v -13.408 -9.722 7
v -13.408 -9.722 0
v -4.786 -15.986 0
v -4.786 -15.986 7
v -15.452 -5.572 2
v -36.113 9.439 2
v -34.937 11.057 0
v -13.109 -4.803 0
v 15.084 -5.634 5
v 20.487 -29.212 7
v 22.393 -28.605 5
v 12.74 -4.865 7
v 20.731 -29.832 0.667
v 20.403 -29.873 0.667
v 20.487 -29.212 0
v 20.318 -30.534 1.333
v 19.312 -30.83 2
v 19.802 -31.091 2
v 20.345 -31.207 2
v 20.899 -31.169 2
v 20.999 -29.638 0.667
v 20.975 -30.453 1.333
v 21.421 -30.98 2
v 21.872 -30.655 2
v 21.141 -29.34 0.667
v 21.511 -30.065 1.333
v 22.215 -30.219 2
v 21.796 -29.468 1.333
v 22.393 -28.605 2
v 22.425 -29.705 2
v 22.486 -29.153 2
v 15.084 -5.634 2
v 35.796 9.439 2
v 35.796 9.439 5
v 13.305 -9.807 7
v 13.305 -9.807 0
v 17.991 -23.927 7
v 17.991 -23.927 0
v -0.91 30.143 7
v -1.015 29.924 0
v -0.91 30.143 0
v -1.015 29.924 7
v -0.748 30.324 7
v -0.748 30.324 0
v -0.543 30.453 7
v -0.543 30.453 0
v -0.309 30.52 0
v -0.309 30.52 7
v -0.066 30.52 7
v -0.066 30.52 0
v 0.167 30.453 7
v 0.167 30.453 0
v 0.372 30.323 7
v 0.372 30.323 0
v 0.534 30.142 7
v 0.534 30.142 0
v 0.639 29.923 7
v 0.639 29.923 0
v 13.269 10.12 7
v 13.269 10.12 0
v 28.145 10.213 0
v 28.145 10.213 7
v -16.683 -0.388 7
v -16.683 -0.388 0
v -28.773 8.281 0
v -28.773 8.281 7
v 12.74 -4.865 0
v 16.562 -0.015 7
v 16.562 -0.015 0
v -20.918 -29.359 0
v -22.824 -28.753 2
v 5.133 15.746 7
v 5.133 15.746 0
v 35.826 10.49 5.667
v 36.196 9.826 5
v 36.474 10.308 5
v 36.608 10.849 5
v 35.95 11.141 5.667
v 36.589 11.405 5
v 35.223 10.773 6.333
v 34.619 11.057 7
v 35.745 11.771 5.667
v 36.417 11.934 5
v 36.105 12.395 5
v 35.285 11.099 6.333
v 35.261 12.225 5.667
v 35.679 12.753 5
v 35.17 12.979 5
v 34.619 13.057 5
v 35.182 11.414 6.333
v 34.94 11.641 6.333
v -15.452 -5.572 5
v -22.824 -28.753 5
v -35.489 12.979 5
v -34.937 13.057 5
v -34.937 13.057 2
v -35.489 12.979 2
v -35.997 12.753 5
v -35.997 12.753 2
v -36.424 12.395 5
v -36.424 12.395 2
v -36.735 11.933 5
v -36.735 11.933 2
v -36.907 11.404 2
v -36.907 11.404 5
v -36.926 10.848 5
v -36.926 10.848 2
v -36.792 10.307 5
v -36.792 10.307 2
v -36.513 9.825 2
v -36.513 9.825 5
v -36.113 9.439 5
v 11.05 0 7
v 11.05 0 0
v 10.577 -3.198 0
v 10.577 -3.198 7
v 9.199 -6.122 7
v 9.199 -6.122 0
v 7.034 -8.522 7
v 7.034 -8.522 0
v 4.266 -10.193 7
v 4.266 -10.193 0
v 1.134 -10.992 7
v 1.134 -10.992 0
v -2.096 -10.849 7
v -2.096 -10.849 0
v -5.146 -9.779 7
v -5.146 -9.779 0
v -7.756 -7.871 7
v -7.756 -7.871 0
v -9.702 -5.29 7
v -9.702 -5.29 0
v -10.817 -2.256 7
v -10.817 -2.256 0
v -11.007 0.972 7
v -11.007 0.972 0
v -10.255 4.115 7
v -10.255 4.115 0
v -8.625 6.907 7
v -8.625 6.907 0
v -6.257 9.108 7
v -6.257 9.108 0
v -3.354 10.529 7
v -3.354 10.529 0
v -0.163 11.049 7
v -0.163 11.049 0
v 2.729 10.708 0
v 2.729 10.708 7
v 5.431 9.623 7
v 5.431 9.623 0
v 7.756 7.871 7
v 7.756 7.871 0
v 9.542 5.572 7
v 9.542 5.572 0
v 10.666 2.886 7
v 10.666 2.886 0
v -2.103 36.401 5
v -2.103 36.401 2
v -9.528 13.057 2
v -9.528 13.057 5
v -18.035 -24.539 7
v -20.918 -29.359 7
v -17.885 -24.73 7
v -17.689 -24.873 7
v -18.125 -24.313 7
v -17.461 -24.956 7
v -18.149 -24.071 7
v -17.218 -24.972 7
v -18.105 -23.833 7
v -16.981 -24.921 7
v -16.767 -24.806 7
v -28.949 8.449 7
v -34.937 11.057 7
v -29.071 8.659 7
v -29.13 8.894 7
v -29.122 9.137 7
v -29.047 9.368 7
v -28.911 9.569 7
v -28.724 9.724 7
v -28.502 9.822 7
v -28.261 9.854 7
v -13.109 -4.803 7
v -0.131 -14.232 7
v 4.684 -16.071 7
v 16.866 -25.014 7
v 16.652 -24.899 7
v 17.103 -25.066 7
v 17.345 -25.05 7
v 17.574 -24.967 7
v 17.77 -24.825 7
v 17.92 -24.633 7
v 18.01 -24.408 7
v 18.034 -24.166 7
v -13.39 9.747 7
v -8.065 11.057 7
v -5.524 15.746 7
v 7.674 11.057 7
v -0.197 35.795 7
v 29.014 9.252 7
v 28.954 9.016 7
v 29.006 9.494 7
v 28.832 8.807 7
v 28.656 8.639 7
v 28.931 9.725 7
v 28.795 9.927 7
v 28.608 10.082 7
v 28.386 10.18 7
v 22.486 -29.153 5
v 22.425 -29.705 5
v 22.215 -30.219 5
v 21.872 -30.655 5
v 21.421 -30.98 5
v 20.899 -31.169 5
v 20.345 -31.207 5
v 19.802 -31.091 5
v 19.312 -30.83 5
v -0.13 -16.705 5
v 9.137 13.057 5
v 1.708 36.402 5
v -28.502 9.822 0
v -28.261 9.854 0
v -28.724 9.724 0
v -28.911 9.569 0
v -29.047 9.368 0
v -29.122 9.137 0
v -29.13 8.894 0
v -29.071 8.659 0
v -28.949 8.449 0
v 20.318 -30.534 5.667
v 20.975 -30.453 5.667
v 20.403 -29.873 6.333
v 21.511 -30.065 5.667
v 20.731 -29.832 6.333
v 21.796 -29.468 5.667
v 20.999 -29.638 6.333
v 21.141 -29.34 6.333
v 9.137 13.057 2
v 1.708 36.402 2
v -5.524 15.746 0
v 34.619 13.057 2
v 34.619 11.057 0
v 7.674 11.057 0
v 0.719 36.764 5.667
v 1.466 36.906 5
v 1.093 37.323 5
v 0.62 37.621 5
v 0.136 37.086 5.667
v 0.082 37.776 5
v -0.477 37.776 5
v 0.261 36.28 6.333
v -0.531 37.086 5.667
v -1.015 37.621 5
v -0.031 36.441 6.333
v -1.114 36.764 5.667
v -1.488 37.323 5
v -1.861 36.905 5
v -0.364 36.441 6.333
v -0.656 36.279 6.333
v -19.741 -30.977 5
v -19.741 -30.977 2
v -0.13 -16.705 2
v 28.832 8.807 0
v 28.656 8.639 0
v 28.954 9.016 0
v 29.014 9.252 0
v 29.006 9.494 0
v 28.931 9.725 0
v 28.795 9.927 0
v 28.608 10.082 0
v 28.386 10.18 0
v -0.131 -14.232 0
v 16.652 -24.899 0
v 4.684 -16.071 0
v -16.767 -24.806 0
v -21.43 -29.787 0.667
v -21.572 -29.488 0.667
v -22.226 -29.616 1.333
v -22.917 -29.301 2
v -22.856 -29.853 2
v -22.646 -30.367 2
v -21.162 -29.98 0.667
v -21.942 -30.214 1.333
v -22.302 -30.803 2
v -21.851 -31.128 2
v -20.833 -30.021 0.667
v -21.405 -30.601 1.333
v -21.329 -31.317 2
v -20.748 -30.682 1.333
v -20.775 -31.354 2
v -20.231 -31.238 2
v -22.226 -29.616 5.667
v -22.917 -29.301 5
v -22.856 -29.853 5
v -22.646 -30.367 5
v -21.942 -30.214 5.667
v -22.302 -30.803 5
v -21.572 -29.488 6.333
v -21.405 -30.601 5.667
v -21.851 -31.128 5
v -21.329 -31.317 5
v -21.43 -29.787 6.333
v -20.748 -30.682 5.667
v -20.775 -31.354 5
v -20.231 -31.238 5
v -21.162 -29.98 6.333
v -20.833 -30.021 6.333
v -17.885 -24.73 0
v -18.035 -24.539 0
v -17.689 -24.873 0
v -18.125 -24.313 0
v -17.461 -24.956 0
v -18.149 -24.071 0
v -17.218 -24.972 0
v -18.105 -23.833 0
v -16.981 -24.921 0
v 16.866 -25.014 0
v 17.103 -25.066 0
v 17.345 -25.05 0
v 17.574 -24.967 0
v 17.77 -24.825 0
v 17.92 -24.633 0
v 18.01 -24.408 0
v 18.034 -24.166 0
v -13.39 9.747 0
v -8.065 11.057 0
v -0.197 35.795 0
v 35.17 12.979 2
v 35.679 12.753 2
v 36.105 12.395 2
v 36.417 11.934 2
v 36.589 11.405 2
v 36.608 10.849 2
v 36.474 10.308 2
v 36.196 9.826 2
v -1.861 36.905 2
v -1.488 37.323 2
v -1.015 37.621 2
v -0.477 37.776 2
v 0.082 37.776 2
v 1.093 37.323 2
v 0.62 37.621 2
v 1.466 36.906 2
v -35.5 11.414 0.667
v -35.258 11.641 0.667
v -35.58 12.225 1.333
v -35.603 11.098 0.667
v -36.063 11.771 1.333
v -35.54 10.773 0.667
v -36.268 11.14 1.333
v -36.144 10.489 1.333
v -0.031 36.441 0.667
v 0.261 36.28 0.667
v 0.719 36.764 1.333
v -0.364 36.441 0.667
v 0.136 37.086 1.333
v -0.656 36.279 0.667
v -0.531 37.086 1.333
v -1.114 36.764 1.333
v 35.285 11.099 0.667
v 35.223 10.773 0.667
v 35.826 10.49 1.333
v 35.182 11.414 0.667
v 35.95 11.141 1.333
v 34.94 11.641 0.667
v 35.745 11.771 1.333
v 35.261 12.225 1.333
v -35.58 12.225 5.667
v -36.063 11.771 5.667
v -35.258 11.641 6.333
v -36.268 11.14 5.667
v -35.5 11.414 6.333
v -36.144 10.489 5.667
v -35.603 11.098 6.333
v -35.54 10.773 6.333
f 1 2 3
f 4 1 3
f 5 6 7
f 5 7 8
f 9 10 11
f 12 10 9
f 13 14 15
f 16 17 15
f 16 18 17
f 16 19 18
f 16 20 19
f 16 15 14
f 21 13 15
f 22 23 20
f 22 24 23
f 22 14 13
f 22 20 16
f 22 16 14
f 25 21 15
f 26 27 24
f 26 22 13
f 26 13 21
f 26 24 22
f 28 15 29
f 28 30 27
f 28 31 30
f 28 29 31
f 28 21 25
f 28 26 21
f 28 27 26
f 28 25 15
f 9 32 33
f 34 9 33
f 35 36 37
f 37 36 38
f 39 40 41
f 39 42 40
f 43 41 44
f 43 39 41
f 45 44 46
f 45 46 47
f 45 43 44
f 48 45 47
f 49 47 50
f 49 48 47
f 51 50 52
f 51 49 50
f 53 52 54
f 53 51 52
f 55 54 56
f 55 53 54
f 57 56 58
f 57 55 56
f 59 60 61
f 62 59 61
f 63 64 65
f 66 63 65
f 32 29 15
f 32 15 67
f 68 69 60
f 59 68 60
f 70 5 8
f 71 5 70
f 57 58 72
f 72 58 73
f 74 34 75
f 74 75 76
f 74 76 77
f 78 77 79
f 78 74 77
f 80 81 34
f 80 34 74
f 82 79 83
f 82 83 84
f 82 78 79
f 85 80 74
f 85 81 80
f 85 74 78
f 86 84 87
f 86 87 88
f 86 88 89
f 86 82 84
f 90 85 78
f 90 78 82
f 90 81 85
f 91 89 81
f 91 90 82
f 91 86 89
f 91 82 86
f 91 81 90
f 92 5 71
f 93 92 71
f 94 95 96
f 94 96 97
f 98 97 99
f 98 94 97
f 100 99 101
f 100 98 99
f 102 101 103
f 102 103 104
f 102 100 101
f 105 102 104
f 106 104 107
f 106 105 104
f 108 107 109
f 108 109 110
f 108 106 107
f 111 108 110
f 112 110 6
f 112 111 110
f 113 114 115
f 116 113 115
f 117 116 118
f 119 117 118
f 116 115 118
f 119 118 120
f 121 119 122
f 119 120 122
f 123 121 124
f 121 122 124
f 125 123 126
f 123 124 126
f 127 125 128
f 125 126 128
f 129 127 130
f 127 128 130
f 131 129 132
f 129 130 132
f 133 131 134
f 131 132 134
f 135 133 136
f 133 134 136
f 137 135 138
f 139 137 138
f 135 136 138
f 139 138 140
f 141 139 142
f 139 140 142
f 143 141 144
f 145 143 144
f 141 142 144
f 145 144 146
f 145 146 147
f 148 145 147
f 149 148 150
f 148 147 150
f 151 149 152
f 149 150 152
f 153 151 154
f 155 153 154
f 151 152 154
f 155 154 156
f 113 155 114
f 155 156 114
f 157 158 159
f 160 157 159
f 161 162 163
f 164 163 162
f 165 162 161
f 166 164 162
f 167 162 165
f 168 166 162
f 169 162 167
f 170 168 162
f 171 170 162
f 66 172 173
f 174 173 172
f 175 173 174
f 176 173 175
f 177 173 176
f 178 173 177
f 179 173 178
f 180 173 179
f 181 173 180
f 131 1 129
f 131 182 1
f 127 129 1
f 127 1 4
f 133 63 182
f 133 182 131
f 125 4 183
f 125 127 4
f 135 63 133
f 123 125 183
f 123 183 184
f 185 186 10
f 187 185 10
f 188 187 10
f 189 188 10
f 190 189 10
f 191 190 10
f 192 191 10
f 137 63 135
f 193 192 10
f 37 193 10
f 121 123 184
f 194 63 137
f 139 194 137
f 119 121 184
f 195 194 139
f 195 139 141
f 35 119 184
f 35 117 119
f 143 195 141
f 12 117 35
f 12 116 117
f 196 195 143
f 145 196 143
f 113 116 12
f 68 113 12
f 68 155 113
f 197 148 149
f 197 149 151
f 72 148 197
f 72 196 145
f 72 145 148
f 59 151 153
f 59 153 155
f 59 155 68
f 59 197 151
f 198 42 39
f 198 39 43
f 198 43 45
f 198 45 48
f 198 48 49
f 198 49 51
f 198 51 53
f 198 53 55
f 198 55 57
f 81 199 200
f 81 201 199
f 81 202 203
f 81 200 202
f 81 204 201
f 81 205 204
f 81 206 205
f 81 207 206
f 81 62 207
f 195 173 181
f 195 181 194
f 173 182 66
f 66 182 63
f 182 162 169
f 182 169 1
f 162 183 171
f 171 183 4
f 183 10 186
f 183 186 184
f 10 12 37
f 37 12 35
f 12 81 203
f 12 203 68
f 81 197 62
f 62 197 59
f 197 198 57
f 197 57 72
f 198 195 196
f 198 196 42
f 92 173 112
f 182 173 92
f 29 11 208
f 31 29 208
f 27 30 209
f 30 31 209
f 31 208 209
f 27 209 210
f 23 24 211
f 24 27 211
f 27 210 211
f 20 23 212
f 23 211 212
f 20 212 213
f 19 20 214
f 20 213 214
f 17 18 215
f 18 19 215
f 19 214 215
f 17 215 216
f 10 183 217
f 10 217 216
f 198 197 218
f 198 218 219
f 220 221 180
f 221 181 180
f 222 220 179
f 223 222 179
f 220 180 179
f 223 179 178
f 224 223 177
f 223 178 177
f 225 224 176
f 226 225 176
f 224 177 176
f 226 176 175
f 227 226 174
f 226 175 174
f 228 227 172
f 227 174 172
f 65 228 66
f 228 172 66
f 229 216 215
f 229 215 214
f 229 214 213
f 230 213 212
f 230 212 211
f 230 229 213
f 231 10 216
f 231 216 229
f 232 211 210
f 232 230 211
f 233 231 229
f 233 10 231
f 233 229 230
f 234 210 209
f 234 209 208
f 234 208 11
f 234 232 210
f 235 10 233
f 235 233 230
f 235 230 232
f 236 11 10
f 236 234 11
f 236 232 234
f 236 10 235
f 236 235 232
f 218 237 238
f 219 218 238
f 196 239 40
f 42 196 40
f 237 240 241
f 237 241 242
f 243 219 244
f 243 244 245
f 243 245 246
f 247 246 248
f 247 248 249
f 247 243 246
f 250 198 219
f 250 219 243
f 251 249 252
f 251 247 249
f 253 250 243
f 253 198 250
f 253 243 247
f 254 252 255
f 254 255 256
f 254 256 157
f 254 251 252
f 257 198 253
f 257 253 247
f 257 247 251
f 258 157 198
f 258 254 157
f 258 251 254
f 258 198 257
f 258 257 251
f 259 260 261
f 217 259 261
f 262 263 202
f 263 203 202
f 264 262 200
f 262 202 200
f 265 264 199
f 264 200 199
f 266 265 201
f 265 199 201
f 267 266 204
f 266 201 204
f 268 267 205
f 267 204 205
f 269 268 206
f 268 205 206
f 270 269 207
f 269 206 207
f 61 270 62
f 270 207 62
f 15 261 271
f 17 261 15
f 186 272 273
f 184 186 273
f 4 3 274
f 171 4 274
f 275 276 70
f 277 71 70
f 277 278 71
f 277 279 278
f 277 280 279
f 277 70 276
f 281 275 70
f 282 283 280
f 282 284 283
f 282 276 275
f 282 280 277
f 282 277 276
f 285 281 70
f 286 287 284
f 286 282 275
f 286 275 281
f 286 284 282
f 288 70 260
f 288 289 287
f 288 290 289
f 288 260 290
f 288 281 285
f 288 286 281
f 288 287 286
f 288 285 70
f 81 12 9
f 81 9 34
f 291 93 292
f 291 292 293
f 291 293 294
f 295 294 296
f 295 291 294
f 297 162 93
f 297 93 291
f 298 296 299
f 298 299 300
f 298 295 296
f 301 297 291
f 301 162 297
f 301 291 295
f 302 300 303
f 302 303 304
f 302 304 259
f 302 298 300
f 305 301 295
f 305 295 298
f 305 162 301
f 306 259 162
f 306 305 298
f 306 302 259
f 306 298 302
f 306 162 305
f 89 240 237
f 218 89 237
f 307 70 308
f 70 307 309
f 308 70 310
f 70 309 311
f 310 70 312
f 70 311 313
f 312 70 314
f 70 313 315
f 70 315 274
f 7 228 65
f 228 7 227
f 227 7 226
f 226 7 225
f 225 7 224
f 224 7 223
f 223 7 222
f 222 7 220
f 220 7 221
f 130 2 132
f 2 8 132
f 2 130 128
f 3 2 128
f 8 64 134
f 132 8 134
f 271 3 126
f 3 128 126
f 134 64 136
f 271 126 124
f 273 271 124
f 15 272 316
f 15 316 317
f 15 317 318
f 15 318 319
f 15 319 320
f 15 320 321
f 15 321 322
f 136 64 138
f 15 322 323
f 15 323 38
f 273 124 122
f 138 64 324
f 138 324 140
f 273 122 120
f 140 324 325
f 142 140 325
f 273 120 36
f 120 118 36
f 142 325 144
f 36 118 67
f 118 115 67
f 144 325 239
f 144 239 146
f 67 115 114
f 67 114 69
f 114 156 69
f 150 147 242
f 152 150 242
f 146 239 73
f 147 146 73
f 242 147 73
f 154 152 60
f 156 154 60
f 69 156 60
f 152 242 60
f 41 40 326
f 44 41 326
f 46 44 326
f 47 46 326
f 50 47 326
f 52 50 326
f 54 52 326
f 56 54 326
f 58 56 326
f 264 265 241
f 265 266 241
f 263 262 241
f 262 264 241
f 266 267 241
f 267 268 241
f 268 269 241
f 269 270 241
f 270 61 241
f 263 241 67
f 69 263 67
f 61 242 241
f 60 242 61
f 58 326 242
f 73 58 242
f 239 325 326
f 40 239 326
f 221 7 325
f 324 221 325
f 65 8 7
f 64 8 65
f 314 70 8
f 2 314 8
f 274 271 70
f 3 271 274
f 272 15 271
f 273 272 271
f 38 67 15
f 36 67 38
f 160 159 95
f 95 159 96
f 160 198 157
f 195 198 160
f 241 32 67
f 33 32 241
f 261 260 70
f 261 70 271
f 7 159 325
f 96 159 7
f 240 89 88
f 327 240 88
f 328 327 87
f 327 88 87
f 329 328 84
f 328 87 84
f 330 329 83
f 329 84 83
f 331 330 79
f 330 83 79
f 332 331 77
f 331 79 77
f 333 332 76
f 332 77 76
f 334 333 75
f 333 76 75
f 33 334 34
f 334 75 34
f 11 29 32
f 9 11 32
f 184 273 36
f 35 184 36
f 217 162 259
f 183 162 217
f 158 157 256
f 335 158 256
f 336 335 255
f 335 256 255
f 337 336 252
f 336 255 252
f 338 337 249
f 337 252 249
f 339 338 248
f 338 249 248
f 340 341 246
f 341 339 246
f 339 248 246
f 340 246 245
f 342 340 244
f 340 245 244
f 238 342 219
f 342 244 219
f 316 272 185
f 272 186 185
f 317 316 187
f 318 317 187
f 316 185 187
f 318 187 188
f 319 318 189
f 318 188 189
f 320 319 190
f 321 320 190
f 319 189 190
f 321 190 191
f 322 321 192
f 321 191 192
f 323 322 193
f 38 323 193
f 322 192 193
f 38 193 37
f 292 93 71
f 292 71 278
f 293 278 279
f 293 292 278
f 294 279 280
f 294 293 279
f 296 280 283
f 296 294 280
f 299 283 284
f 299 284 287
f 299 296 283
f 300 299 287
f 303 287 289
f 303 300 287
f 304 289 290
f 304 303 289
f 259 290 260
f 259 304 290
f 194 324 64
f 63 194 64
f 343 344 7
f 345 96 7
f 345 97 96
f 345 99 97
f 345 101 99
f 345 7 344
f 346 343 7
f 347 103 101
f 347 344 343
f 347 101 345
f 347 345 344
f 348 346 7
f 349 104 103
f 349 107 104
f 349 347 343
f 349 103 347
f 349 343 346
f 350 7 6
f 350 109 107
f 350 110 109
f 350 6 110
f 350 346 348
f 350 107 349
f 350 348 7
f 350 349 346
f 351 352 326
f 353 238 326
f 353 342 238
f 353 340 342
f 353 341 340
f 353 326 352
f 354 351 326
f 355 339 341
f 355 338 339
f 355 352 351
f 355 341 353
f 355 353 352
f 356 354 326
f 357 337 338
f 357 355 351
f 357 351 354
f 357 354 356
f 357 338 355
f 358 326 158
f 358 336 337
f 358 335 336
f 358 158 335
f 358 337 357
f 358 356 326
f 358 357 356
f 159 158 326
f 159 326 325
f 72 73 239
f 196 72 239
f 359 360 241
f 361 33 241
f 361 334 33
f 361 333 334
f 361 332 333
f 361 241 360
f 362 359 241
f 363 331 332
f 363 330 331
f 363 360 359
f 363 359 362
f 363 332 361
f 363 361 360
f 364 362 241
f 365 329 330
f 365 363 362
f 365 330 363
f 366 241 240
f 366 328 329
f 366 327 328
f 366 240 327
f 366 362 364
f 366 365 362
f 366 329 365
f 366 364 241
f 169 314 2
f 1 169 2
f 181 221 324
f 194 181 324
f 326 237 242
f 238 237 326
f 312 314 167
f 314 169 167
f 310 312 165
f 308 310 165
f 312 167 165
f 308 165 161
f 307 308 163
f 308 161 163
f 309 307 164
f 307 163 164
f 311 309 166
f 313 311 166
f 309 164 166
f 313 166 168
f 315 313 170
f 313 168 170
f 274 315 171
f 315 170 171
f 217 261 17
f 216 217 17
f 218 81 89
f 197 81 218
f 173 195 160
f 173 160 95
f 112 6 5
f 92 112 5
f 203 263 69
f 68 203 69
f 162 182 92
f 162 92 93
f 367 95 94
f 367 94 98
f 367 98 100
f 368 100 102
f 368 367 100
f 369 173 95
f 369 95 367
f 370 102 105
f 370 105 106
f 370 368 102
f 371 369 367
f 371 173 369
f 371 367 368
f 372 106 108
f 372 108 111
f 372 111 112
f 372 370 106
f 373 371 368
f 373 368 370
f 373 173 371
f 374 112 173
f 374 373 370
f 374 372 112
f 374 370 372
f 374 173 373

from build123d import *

# Parameters (mm, degrees)
F1_DEPTH = 7
F2_R     = 2
F3_R     = 0.8678369572
F4_SIZE  = 1.99999
F5_SIZE  = 1.99999


# Not quite as in the source:
# - a fillet or chamfer is up to 0.001 mm smaller than in the source, because OpenCascade refuses the exact size


with BuildPart() as f1:
    # F0 (on Top) → F1 (new body)
    with BuildSketch(Plane.XY):
        Polygon((9.1365975469, 13.0565894232), (-0.1652448664, 13.0565894232), (-9.5275098884, 13.0565894232), (-15.4519321666, -5.5724489729), (-0.1296436349, -16.7047432175), (15.0836615604, -5.6335964123), align=None)
        with BuildLine():
            ThreePointArc((-0.1630055447, 11.0487976356), (7.7556846484, 7.87095011), (11.05, 0))
            ThreePointArc((11.05, 0), (-7.7556846484, -7.87095011), (-0.1630055447, 11.0487976356))
        make_face(mode=Mode.SUBTRACT)
        Polygon((-9.5275098884, 13.0565894232), (-0.1652448664, 13.0565894232), (-0.1682447051, 15.7462661459), (-5.5240840498, 15.7462661459), (-0.1869622706, 32.5285686018), (-0.1979640721, 42.3928620705), align=None)
        Polygon((-0.1682447051, 15.7462661459), (-0.1652448664, 13.0565894232), (9.1365975469, 13.0565894232), (-0.1979640721, 42.3928620705), (-0.1869622706, 32.5285686018), (5.1325563495, 15.7462661459), align=None)
        Polygon((-15.4519321666, -5.5724489729), (-9.5275098884, 13.0565894232), (-41.0926038108, 13.0565894232), align=None)
        Polygon((-16.6826248751, -0.3878522951), (-30.9942816534, 9.8740688149), (-13.3895418888, 9.7472149984), align=None, mode=Mode.SUBTRACT)
        Polygon((40.7665927214, 13.0565894232), (9.1365975469, 13.0565894232), (15.0836615604, -5.6335964123), align=None)
        Polygon((13.2685531756, 10.1195799691), (30.8787326155, 10.2296921864), (16.561636162, -0.0154873244), align=None, mode=Mode.SUBTRACT)
        Polygon((-0.1296436349, -16.7047432175), (-15.4519321666, -5.5724489729), (-24.67217675, -34.5650295656), align=None)
        Polygon((-4.7863451446, -15.9859720469), (-18.9685572481, -26.4260584669), (-13.4077483305, -9.7221559812), align=None, mode=Mode.SUBTRACT)
        Polygon((24.2402355164, -34.4104968233), (15.0836615604, -5.6335964123), (-0.1296436349, -16.7047432175), align=None)
        Polygon((13.3053196858, -9.8071458261), (18.8518873485, -26.5213951891), (4.6839164999, -16.0709618918), align=None, mode=Mode.SUBTRACT)
    extrude(amount=F1_DEPTH)

    # F2
    f2_edges = [f1.edges().sort_by_distance(p)[0] for p in [
        (-0.197964, 42.392862, 3.5),
        (40.766593, 13.056589, 3.5),
        (24.240236, -34.410497, 3.5),
        (-24.672177, -34.56503, 3.5),
        (-41.092604, 13.056589, 3.5),
    ]]
    fillet(f2_edges, radius=F2_R)

    # F3
    f3_edges = [f1.edges().sort_by_distance(p)[0] for p in [
        (-18.968557, -26.426058, 3.5),
        (-30.994282, 9.874069, 3.5),
        (18.851887, -26.521395, 3.5),
        (30.878733, 10.229692, 3.5),
        (-0.186962, 32.528569, 3.5),
    ]]
    fillet(f3_edges, radius=F3_R)

    # F4 (size 2 in the source; OpenCascade refuses exactly that, so slightly less here)
    f4_edges = [f1.edges().sort_by_distance(p)[0] for p in [
        (-22.232373, 13.056589, 7),
        (-5.815451, 24.728966, 7),
        (-0.197607, 37.795214, 7),
        (5.422496, 24.729114, 7),
        (21.877967, 13.056589, 7),
        (36.521209, 11.675361, 7),
        (25.439911, 1.902936, 7),
        (18.738348, -17.119392, 7),
        (21.65782, -30.833222, 7),
        (9.590987, -23.767195, 7),
        (-9.935411, -23.840674, 7),
        (-19.137937, -17.162901, 7),
        (-25.78237, 1.933053, 7),
        (-36.83935, 11.674623, 7),
    ]]
    chamfer(f4_edges, length=F4_SIZE)

    # F5 (size 2 in the source; OpenCascade refuses exactly that, so slightly less here)
    f5_edges = [f1.edges().sort_by_distance(p)[0] for p in [
        (21.877967, 13.056589, 0),
        (5.422496, 24.729114, 0),
        (-5.815451, 24.728966, 0),
        (-22.232373, 13.056589, 0),
        (-25.78237, 1.933053, 0),
        (-19.137937, -17.162901, 0),
        (-9.935411, -23.840674, 0),
        (9.590987, -23.767195, 0),
        (25.439911, 1.902936, 0),
        (18.738348, -17.119392, 0),
        (-36.83935, 11.674623, 0),
        (-0.197607, 37.795214, 0),
        (36.521209, 11.675361, 0),
        (21.65782, -30.833222, 0),
        (-22.08788, -30.981637, 0),
    ]]
    chamfer(f5_edges, length=F5_SIZE)


solid = f1.part
